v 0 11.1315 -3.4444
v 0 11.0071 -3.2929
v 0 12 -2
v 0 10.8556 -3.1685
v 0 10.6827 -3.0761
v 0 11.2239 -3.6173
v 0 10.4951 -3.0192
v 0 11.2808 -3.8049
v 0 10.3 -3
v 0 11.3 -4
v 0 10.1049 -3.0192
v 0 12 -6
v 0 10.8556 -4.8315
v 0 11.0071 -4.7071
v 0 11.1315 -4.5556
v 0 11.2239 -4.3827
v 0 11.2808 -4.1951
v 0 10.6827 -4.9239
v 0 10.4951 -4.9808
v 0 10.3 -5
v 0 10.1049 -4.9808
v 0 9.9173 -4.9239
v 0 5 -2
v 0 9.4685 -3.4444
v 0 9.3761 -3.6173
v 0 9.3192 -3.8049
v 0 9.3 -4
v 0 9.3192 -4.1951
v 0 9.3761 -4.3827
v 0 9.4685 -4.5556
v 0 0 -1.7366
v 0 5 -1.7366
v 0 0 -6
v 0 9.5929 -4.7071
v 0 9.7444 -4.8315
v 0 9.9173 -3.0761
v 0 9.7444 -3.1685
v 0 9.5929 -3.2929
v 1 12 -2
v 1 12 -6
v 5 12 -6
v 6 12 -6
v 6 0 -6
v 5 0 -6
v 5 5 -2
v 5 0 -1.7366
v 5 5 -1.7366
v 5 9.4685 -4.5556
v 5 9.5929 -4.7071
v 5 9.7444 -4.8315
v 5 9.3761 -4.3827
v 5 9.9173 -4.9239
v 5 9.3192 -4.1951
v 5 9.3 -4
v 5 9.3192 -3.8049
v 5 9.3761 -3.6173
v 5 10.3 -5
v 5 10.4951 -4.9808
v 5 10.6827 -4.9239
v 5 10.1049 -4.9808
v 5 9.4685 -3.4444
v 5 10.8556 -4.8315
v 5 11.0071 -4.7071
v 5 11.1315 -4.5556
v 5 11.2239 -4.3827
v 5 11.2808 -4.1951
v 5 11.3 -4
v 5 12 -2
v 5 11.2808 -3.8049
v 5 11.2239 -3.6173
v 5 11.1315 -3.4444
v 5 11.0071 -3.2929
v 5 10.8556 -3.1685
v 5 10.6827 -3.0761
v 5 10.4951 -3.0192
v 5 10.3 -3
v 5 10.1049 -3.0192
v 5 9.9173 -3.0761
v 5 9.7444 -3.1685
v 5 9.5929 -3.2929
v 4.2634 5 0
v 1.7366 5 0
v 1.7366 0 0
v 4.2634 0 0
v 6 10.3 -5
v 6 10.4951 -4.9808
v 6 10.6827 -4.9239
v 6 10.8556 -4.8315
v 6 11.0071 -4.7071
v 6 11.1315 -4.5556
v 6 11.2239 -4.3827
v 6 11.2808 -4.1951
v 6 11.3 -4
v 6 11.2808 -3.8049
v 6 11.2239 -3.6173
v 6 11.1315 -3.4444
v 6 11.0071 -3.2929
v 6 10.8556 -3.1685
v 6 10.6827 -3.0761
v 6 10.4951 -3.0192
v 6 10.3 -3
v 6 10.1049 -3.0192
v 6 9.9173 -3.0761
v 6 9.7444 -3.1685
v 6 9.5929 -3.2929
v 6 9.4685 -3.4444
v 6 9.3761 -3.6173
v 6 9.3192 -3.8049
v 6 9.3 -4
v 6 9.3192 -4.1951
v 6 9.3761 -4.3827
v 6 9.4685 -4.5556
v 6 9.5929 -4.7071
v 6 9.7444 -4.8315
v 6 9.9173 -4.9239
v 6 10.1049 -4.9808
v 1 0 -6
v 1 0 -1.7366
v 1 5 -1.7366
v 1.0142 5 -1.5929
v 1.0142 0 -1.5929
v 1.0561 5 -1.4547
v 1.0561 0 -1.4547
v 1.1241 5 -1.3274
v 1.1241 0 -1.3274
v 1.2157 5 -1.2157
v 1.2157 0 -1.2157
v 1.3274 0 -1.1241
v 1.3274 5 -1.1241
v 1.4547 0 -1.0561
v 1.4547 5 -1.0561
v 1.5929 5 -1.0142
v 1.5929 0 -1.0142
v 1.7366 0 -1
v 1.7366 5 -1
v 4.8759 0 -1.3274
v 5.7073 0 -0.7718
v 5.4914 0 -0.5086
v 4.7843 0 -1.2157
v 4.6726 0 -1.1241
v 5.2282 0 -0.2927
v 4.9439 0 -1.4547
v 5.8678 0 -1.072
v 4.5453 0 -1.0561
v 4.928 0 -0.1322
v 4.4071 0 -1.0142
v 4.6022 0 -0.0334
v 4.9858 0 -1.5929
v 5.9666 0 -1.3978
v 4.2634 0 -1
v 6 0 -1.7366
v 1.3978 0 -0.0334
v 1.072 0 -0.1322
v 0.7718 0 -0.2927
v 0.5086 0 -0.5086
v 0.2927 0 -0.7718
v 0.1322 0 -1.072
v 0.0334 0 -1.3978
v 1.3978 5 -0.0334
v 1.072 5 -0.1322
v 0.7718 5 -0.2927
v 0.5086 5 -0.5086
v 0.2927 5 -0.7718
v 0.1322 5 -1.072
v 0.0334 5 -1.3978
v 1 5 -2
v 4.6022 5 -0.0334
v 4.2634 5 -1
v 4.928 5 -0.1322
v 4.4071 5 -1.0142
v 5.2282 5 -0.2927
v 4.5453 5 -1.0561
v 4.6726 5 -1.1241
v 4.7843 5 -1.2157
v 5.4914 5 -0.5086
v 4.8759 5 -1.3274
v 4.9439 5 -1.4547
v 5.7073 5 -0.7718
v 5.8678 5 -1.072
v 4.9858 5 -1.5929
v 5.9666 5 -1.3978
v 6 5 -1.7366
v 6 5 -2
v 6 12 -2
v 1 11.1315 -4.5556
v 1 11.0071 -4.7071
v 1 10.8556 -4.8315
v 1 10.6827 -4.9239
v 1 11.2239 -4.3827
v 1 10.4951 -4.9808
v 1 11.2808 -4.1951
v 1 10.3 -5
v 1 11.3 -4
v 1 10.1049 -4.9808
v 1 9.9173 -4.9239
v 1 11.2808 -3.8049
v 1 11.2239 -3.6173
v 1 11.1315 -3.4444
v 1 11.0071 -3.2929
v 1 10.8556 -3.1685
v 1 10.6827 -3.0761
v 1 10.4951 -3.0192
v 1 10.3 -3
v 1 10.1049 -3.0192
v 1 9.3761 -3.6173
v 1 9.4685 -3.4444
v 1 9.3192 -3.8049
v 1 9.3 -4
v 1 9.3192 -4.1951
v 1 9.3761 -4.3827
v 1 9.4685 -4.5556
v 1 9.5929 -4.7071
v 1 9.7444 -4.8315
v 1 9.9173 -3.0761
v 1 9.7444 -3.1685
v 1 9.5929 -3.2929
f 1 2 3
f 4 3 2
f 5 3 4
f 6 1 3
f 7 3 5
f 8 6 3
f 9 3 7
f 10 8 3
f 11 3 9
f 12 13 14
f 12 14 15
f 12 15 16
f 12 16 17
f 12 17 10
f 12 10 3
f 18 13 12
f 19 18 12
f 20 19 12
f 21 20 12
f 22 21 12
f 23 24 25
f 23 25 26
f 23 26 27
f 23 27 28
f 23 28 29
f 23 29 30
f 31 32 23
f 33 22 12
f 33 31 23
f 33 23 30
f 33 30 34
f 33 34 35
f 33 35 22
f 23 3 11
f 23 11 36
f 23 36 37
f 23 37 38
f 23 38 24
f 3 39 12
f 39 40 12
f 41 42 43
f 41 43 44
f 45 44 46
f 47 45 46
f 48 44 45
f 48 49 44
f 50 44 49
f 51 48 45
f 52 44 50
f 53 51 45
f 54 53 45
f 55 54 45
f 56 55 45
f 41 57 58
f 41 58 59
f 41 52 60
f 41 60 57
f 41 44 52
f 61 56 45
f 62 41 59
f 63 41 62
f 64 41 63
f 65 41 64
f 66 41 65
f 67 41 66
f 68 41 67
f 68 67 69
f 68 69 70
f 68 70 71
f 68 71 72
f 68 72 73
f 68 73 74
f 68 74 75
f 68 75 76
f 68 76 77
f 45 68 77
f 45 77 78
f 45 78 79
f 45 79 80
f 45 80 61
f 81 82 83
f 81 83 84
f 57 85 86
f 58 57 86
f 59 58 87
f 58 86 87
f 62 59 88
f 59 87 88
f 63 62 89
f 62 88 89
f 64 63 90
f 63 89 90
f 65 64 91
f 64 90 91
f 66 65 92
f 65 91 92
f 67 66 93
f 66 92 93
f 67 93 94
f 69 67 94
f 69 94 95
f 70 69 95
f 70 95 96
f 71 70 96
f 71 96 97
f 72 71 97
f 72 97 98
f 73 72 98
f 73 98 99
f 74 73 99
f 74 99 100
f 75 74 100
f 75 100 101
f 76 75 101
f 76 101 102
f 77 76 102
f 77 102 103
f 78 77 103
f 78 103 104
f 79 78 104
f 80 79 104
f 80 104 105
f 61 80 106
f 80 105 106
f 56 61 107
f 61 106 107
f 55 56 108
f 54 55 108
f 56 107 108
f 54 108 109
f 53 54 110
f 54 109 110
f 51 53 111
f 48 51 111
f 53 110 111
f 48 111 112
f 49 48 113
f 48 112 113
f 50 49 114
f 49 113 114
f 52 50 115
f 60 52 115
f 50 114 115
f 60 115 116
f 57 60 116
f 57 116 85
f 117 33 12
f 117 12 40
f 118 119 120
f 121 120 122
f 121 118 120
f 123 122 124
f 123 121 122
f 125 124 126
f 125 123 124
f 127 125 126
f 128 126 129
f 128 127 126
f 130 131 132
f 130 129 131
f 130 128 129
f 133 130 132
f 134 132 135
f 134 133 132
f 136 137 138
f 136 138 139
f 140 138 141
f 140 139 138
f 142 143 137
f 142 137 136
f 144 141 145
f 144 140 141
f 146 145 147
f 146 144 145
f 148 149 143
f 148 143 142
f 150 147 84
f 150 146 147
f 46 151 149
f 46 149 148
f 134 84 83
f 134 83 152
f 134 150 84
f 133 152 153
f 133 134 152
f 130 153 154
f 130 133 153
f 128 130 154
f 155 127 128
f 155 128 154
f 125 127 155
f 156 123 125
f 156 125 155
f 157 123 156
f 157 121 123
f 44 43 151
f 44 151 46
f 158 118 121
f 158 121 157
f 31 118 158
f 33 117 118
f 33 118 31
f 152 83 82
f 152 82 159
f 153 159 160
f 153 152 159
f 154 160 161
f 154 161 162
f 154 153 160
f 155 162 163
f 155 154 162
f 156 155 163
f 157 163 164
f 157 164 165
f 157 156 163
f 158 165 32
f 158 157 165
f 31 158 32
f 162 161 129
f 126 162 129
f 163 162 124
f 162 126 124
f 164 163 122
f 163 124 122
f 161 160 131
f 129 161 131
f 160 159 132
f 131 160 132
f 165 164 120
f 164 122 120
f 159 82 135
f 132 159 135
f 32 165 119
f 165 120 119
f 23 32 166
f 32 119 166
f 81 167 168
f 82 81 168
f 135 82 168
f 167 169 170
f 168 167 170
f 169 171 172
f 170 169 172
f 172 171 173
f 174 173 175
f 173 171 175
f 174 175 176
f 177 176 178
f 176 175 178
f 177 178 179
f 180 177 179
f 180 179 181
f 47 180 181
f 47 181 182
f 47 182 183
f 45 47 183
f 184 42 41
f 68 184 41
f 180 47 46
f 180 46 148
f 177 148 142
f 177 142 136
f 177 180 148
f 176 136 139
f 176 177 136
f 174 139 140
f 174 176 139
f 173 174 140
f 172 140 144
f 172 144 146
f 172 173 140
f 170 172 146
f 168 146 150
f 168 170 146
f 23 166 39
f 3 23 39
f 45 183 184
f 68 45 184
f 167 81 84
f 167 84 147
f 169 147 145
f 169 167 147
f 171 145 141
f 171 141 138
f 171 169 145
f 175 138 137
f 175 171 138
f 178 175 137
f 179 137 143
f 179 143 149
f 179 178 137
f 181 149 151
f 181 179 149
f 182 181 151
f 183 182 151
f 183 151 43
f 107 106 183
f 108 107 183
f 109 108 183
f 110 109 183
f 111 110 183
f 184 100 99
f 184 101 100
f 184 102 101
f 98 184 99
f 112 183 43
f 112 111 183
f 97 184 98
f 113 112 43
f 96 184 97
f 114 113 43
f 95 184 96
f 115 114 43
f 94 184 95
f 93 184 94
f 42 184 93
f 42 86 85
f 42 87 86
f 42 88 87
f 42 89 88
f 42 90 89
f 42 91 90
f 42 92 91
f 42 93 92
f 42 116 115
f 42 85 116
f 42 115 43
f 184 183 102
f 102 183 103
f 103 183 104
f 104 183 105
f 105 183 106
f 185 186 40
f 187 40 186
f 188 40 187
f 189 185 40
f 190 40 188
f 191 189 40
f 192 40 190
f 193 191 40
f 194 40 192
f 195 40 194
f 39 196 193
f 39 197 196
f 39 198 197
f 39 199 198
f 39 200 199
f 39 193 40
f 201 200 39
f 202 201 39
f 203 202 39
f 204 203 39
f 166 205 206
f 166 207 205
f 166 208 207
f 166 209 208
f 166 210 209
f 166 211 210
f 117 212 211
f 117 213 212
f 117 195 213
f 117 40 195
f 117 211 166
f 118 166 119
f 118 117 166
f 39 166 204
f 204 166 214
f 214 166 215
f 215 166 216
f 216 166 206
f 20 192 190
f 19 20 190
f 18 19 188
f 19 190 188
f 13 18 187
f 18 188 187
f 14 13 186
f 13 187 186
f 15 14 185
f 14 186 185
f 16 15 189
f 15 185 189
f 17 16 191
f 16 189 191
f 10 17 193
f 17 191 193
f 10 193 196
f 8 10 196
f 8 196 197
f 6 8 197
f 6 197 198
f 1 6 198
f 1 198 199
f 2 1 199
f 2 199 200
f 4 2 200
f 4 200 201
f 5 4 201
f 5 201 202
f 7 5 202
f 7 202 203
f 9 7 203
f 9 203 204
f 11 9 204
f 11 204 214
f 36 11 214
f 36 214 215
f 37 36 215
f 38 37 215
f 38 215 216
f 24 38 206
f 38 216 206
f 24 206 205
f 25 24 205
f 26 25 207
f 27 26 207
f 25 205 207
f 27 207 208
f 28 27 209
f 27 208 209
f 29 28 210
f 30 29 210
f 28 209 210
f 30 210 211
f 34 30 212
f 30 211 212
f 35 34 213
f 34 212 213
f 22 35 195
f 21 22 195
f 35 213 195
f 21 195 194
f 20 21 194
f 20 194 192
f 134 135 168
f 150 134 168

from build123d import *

# Parameters (mm, degrees)
CROQUIS2_W                         = 6
CROQUIS2_H                         = 12
BRIDA_BASE1_DEPTH                  = 1
BRIDA_DE_ARISTA1_STRIP_W           = 5.4732
BRIDA_DE_ARISTA1_STRIP_H           = 1
BRIDA_DE_ARISTA1_STRIP_CUT_DEPTH   = 12
BRIDA_DE_ARISTA1_STRIP_2_W         = 5.4732
BRIDA_DE_ARISTA1_STRIP_2_H         = 1
BRIDA_DE_ARISTA1_STRIP_CUT_2_DEPTH = 12
BRIDA_DE_ARISTA1_DEPTH             = 12
BRIDA_DE_ARISTA1_BEND_DEPTH        = 12
CROQUIS13_W                        = 2
CROQUIS13_H                        = 7
CORTAR_EXTRUIR1_DEPTH              = 10
CORTAR_EXTRUIR2_REACH              = 16.697
CROQUIS14_R                        = 1


# Sheet-metal steps are written as plain solids
with BuildPart() as part:
    # Croquis2 → Brida base1 (new body)
    with BuildSketch(Plane.XY):
        with Locations((3, 6)):
            Rectangle(CROQUIS2_W, CROQUIS2_H)
    extrude(amount=-BRIDA_BASE1_DEPTH)

    # Brida de arista1 strip (across the edge) → Brida de arista1 strip cut (cut)
    with BuildSketch(Plane(origin=(6, 12, -1), x_dir=(-1, 0, 0), z_dir=(0, -1, 0))):
        with Locations((-1, -0.5)):
            Rectangle(BRIDA_DE_ARISTA1_STRIP_W, BRIDA_DE_ARISTA1_STRIP_H)
    extrude(amount=BRIDA_DE_ARISTA1_STRIP_CUT_DEPTH, mode=Mode.SUBTRACT)

    # Brida de arista1 strip 2 (across the edge) → Brida de arista1 strip cut 2 (cut)
    with BuildSketch(Plane(origin=(0, 0, -1), x_dir=(1, 0, 0), z_dir=(0, 1, 0))):
        with Locations((-1, -0.5)):
            Rectangle(BRIDA_DE_ARISTA1_STRIP_2_W, BRIDA_DE_ARISTA1_STRIP_2_H)
    extrude(amount=BRIDA_DE_ARISTA1_STRIP_CUT_2_DEPTH, mode=Mode.SUBTRACT)

    # Brida de arista1 section (across the edge) → Brida de arista1 (add)
    with BuildSketch(Plane(origin=(6, 12, -1), x_dir=(-1, 0, 0), z_dir=(0, -1, 0))):
        with BuildLine():
            Line((0, 0.7366), (0, 5))
            Line((0, 5), (1, 5))
            Line((1, 5), (1, 0.7366))
            ThreePointArc((1, 0.7366), (1.215745145, 0.215745145), (1.7366, 0))
            Line((1.7366, 0), (1.7366, -1))
            ThreePointArc((1.7366, -1), (0.508638364, -0.491361636), (0, 0.7366))
        make_face()
    extrude(amount=BRIDA_DE_ARISTA1_DEPTH)

    # Brida de arista1 section 2 (across the edge) → Brida de arista1 bend (add)
    with BuildSketch(Plane(origin=(0, 0, -1), x_dir=(1, 0, 0), z_dir=(0, 1, 0))):
        with BuildLine():
            Line((0, 0.7366), (0, 5))
            Line((0, 5), (1, 5))
            Line((1, 5), (1, 0.7366))
            ThreePointArc((1, 0.7366), (1.215745145, 0.215745145), (1.7366, 0))
            Line((1.7366, 0), (1.7366, -1))
            ThreePointArc((1.7366, -1), (0.508638364, -0.491361636), (0, 0.7366))
        make_face()
    extrude(amount=BRIDA_DE_ARISTA1_BEND_DEPTH)

    # Croquis13 → Cortar-Extruir1 (cut)
    with BuildSketch(Plane(origin=(6, 0, 0), x_dir=(0, 0, -1), z_dir=(1, 0, 0))):
        with Locations((1, 8.5)):
            Rectangle(CROQUIS13_W, CROQUIS13_H)
    extrude(amount=-CORTAR_EXTRUIR1_DEPTH, mode=Mode.SUBTRACT)

    # Cortar-Extruir2: up to this face of the body (flat: up to its plane)
    cortar_extruir2_end = Plane(part.part.faces().sort_by_distance((0, 5.906533244, -3.943073405))[0])
    # Croquis14 → Cortar-Extruir2 (cut, up to the picked face)
    with BuildSketch(Plane(origin=(6, 0, 0), x_dir=(0, 0, -1), z_dir=(1, 0, 0)), mode=Mode.PRIVATE) as cortar_extruir2_sk1:
        with Locations((4, 10.3)):
            Circle(CROQUIS14_R)
    cortar_extruir2_tool1 = split(extrude(cortar_extruir2_sk1.sketch, amount=-CORTAR_EXTRUIR2_REACH, mode=Mode.PRIVATE), bisect_by=cortar_extruir2_end, keep=Keep.BOTH, mode=Mode.PRIVATE)
    add(cortar_extruir2_tool1.solids().sort_by(Axis((6, 10.3, -4), (-1, 0, 0)))[0], mode=Mode.SUBTRACT)


solid = part.part
